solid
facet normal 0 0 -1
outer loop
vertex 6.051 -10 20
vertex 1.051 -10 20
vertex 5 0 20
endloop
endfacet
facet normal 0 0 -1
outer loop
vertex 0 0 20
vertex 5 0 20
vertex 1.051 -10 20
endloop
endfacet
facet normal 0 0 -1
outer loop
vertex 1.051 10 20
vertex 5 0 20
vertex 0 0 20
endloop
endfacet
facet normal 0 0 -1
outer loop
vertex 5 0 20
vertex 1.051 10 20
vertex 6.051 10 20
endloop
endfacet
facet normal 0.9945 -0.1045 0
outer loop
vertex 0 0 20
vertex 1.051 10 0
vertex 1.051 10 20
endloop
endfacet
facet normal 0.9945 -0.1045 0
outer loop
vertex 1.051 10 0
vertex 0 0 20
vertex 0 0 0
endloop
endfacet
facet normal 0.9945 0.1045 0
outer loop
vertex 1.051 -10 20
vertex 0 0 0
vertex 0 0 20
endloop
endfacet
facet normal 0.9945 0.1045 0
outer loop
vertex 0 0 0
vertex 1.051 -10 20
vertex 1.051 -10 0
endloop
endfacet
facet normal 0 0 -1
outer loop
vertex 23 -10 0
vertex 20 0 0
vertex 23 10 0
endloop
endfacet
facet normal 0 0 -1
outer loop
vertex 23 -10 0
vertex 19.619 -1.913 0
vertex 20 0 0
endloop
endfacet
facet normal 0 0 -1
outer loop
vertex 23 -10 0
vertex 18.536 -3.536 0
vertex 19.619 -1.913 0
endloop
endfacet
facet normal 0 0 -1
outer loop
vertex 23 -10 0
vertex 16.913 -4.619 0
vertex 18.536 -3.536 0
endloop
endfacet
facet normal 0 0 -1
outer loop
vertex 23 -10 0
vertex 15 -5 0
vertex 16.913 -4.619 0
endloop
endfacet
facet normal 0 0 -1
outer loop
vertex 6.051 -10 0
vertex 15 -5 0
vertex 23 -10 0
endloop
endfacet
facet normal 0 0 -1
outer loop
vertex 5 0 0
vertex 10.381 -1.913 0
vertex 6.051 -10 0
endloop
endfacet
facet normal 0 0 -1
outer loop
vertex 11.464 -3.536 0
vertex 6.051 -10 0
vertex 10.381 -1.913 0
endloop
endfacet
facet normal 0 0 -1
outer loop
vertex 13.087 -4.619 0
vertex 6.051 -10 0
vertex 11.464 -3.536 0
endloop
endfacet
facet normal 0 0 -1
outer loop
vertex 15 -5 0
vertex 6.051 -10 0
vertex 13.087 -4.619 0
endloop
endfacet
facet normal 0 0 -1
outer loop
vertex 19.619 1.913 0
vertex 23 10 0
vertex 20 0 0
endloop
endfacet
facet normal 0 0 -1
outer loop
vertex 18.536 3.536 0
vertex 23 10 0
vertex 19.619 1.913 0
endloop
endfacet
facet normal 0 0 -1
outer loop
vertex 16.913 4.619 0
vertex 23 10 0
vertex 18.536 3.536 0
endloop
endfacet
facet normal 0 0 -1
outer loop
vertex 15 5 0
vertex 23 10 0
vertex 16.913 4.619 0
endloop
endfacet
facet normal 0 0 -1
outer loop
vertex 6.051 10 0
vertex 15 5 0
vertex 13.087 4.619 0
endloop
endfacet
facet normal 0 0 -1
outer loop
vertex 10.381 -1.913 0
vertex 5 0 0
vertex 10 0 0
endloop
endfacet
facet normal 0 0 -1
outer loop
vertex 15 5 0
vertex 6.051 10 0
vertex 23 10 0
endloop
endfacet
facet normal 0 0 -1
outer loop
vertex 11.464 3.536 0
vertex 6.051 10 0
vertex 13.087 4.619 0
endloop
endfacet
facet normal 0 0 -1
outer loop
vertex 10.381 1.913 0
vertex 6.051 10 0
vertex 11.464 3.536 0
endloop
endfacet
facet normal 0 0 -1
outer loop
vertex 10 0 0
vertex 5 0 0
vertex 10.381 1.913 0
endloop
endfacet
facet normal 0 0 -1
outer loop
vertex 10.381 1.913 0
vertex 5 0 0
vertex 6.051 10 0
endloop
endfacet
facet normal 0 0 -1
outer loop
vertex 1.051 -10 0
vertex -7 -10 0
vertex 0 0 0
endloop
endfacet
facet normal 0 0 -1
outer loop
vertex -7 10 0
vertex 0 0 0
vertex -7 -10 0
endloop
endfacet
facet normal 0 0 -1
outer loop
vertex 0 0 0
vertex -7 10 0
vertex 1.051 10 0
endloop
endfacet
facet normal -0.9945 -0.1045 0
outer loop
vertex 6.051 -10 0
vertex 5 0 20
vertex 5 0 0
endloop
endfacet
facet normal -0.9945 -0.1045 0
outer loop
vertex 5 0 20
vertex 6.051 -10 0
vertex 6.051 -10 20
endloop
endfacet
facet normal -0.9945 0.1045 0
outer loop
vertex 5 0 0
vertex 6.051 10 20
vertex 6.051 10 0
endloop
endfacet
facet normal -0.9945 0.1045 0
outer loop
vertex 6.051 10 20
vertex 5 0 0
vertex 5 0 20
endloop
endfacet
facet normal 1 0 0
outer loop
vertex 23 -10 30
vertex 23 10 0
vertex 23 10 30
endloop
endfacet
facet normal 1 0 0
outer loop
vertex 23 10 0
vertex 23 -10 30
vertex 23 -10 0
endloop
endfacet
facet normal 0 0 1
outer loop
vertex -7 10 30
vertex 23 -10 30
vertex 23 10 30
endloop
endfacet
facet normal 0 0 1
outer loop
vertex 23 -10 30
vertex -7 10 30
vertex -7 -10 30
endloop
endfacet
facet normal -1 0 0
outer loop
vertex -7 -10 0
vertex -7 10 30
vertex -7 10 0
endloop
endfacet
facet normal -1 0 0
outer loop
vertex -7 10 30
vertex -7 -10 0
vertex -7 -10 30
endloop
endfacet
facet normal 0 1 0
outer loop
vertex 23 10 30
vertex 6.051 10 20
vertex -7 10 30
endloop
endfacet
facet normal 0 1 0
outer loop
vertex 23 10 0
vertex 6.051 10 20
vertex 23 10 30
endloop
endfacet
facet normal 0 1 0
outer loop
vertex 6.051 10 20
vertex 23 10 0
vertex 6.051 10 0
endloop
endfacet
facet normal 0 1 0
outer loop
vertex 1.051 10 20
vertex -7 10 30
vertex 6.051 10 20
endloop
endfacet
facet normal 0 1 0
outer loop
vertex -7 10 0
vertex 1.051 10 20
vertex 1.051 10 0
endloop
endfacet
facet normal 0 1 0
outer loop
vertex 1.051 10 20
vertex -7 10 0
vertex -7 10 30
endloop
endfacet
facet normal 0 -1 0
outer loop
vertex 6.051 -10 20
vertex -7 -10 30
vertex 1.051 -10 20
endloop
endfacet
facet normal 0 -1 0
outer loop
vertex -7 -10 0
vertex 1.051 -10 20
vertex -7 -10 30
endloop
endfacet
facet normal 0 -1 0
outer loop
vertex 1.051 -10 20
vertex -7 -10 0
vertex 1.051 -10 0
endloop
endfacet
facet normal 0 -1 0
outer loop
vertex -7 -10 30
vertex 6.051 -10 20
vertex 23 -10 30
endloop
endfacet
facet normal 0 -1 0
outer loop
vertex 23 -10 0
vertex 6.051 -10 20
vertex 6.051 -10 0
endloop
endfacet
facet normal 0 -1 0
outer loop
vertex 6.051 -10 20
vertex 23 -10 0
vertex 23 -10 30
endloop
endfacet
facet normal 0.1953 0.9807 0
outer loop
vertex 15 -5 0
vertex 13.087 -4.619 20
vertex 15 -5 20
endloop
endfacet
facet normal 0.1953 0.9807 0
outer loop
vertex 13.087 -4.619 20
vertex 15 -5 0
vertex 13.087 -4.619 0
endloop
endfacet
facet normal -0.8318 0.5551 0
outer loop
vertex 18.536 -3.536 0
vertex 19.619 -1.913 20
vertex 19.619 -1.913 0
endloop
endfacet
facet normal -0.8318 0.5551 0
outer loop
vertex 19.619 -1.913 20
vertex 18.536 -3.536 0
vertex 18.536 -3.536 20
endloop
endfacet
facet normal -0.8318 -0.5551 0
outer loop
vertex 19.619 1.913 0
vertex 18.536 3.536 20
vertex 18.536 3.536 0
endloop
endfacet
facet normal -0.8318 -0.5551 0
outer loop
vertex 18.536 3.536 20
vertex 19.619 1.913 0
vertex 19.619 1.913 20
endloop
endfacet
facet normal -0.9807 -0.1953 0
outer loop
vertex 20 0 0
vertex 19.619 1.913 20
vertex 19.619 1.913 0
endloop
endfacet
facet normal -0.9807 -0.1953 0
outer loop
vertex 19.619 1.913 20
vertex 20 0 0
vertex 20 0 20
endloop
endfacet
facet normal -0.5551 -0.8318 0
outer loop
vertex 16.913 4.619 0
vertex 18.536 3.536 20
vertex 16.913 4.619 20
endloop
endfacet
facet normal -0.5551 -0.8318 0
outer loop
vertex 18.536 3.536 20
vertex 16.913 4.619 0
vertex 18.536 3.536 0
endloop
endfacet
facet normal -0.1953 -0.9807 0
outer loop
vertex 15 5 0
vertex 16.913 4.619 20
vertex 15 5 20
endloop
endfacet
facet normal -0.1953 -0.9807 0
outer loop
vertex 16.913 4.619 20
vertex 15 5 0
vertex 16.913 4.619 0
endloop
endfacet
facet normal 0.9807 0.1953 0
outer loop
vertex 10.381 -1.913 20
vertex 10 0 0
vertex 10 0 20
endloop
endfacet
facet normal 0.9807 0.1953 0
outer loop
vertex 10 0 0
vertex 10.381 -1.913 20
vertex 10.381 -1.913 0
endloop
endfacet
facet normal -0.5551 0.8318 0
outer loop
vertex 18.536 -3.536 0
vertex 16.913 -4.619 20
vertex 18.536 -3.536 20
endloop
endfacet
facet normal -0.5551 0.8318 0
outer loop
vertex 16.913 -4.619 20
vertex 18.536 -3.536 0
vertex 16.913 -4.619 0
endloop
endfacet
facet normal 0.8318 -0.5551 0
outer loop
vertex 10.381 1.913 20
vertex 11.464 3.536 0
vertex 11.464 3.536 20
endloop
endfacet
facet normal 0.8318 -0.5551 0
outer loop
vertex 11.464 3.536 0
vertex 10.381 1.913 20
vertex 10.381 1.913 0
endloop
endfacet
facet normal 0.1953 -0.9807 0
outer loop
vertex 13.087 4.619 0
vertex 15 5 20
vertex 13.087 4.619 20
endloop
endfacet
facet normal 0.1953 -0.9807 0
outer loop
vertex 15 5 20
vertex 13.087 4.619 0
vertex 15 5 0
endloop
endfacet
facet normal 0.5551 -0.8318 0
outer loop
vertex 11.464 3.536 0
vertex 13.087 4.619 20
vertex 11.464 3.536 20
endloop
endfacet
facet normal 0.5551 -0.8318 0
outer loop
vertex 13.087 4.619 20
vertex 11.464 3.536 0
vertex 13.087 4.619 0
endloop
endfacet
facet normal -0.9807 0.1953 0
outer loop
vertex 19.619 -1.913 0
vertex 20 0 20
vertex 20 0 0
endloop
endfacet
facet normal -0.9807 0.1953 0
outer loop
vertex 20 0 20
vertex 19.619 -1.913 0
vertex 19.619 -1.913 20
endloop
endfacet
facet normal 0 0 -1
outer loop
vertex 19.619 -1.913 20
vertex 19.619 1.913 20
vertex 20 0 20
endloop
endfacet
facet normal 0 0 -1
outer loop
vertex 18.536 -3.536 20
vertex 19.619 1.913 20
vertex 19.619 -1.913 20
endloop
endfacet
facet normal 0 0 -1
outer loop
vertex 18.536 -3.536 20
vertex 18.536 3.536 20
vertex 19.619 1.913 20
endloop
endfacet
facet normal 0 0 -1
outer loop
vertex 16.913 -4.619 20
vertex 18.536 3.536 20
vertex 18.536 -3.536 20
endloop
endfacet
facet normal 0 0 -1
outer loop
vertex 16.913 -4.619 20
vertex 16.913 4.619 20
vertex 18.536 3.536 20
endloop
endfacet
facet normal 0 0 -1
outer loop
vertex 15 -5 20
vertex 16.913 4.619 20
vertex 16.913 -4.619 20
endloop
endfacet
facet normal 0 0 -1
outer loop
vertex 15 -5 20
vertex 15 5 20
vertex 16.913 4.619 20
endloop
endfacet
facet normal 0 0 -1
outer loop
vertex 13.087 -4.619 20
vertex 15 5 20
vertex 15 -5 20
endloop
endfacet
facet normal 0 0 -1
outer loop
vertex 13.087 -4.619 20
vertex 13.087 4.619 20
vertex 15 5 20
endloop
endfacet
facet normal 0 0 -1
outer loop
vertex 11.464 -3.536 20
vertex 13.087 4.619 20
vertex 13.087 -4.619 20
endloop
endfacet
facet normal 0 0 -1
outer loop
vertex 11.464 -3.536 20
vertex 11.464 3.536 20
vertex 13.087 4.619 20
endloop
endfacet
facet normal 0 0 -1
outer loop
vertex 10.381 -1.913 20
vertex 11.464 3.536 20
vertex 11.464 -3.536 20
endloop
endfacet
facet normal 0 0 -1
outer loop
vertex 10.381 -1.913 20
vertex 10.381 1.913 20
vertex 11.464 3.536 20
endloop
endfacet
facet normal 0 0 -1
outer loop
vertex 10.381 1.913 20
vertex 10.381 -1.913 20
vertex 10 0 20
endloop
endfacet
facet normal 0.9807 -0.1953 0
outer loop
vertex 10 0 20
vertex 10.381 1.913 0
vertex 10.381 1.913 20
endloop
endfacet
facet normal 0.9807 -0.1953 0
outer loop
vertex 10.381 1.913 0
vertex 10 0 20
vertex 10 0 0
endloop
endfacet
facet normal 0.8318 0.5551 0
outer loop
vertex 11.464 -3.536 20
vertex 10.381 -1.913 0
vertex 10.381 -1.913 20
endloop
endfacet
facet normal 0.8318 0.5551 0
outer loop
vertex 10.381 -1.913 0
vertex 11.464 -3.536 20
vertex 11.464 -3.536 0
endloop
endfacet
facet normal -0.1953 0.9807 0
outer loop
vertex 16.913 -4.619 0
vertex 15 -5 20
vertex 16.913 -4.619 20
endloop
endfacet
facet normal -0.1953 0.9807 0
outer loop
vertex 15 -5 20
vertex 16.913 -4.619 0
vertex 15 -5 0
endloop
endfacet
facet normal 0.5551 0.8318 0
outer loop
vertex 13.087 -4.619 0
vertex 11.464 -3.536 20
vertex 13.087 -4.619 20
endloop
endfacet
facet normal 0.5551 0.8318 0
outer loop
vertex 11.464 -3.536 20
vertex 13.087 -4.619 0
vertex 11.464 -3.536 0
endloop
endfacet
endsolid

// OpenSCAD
difference(){
difference(){
	translate([8,0,15])
	cube(size = [30,20,30], center = true);
		union(){
		translate([55,0,0])
			difference(){
				// removed groove
				cylinder(h = 20, r=55);
				cylinder(h = 20, r=50);
			}

		}
translate([15,0])
cylinder(h = 20, r=5);
}
}
